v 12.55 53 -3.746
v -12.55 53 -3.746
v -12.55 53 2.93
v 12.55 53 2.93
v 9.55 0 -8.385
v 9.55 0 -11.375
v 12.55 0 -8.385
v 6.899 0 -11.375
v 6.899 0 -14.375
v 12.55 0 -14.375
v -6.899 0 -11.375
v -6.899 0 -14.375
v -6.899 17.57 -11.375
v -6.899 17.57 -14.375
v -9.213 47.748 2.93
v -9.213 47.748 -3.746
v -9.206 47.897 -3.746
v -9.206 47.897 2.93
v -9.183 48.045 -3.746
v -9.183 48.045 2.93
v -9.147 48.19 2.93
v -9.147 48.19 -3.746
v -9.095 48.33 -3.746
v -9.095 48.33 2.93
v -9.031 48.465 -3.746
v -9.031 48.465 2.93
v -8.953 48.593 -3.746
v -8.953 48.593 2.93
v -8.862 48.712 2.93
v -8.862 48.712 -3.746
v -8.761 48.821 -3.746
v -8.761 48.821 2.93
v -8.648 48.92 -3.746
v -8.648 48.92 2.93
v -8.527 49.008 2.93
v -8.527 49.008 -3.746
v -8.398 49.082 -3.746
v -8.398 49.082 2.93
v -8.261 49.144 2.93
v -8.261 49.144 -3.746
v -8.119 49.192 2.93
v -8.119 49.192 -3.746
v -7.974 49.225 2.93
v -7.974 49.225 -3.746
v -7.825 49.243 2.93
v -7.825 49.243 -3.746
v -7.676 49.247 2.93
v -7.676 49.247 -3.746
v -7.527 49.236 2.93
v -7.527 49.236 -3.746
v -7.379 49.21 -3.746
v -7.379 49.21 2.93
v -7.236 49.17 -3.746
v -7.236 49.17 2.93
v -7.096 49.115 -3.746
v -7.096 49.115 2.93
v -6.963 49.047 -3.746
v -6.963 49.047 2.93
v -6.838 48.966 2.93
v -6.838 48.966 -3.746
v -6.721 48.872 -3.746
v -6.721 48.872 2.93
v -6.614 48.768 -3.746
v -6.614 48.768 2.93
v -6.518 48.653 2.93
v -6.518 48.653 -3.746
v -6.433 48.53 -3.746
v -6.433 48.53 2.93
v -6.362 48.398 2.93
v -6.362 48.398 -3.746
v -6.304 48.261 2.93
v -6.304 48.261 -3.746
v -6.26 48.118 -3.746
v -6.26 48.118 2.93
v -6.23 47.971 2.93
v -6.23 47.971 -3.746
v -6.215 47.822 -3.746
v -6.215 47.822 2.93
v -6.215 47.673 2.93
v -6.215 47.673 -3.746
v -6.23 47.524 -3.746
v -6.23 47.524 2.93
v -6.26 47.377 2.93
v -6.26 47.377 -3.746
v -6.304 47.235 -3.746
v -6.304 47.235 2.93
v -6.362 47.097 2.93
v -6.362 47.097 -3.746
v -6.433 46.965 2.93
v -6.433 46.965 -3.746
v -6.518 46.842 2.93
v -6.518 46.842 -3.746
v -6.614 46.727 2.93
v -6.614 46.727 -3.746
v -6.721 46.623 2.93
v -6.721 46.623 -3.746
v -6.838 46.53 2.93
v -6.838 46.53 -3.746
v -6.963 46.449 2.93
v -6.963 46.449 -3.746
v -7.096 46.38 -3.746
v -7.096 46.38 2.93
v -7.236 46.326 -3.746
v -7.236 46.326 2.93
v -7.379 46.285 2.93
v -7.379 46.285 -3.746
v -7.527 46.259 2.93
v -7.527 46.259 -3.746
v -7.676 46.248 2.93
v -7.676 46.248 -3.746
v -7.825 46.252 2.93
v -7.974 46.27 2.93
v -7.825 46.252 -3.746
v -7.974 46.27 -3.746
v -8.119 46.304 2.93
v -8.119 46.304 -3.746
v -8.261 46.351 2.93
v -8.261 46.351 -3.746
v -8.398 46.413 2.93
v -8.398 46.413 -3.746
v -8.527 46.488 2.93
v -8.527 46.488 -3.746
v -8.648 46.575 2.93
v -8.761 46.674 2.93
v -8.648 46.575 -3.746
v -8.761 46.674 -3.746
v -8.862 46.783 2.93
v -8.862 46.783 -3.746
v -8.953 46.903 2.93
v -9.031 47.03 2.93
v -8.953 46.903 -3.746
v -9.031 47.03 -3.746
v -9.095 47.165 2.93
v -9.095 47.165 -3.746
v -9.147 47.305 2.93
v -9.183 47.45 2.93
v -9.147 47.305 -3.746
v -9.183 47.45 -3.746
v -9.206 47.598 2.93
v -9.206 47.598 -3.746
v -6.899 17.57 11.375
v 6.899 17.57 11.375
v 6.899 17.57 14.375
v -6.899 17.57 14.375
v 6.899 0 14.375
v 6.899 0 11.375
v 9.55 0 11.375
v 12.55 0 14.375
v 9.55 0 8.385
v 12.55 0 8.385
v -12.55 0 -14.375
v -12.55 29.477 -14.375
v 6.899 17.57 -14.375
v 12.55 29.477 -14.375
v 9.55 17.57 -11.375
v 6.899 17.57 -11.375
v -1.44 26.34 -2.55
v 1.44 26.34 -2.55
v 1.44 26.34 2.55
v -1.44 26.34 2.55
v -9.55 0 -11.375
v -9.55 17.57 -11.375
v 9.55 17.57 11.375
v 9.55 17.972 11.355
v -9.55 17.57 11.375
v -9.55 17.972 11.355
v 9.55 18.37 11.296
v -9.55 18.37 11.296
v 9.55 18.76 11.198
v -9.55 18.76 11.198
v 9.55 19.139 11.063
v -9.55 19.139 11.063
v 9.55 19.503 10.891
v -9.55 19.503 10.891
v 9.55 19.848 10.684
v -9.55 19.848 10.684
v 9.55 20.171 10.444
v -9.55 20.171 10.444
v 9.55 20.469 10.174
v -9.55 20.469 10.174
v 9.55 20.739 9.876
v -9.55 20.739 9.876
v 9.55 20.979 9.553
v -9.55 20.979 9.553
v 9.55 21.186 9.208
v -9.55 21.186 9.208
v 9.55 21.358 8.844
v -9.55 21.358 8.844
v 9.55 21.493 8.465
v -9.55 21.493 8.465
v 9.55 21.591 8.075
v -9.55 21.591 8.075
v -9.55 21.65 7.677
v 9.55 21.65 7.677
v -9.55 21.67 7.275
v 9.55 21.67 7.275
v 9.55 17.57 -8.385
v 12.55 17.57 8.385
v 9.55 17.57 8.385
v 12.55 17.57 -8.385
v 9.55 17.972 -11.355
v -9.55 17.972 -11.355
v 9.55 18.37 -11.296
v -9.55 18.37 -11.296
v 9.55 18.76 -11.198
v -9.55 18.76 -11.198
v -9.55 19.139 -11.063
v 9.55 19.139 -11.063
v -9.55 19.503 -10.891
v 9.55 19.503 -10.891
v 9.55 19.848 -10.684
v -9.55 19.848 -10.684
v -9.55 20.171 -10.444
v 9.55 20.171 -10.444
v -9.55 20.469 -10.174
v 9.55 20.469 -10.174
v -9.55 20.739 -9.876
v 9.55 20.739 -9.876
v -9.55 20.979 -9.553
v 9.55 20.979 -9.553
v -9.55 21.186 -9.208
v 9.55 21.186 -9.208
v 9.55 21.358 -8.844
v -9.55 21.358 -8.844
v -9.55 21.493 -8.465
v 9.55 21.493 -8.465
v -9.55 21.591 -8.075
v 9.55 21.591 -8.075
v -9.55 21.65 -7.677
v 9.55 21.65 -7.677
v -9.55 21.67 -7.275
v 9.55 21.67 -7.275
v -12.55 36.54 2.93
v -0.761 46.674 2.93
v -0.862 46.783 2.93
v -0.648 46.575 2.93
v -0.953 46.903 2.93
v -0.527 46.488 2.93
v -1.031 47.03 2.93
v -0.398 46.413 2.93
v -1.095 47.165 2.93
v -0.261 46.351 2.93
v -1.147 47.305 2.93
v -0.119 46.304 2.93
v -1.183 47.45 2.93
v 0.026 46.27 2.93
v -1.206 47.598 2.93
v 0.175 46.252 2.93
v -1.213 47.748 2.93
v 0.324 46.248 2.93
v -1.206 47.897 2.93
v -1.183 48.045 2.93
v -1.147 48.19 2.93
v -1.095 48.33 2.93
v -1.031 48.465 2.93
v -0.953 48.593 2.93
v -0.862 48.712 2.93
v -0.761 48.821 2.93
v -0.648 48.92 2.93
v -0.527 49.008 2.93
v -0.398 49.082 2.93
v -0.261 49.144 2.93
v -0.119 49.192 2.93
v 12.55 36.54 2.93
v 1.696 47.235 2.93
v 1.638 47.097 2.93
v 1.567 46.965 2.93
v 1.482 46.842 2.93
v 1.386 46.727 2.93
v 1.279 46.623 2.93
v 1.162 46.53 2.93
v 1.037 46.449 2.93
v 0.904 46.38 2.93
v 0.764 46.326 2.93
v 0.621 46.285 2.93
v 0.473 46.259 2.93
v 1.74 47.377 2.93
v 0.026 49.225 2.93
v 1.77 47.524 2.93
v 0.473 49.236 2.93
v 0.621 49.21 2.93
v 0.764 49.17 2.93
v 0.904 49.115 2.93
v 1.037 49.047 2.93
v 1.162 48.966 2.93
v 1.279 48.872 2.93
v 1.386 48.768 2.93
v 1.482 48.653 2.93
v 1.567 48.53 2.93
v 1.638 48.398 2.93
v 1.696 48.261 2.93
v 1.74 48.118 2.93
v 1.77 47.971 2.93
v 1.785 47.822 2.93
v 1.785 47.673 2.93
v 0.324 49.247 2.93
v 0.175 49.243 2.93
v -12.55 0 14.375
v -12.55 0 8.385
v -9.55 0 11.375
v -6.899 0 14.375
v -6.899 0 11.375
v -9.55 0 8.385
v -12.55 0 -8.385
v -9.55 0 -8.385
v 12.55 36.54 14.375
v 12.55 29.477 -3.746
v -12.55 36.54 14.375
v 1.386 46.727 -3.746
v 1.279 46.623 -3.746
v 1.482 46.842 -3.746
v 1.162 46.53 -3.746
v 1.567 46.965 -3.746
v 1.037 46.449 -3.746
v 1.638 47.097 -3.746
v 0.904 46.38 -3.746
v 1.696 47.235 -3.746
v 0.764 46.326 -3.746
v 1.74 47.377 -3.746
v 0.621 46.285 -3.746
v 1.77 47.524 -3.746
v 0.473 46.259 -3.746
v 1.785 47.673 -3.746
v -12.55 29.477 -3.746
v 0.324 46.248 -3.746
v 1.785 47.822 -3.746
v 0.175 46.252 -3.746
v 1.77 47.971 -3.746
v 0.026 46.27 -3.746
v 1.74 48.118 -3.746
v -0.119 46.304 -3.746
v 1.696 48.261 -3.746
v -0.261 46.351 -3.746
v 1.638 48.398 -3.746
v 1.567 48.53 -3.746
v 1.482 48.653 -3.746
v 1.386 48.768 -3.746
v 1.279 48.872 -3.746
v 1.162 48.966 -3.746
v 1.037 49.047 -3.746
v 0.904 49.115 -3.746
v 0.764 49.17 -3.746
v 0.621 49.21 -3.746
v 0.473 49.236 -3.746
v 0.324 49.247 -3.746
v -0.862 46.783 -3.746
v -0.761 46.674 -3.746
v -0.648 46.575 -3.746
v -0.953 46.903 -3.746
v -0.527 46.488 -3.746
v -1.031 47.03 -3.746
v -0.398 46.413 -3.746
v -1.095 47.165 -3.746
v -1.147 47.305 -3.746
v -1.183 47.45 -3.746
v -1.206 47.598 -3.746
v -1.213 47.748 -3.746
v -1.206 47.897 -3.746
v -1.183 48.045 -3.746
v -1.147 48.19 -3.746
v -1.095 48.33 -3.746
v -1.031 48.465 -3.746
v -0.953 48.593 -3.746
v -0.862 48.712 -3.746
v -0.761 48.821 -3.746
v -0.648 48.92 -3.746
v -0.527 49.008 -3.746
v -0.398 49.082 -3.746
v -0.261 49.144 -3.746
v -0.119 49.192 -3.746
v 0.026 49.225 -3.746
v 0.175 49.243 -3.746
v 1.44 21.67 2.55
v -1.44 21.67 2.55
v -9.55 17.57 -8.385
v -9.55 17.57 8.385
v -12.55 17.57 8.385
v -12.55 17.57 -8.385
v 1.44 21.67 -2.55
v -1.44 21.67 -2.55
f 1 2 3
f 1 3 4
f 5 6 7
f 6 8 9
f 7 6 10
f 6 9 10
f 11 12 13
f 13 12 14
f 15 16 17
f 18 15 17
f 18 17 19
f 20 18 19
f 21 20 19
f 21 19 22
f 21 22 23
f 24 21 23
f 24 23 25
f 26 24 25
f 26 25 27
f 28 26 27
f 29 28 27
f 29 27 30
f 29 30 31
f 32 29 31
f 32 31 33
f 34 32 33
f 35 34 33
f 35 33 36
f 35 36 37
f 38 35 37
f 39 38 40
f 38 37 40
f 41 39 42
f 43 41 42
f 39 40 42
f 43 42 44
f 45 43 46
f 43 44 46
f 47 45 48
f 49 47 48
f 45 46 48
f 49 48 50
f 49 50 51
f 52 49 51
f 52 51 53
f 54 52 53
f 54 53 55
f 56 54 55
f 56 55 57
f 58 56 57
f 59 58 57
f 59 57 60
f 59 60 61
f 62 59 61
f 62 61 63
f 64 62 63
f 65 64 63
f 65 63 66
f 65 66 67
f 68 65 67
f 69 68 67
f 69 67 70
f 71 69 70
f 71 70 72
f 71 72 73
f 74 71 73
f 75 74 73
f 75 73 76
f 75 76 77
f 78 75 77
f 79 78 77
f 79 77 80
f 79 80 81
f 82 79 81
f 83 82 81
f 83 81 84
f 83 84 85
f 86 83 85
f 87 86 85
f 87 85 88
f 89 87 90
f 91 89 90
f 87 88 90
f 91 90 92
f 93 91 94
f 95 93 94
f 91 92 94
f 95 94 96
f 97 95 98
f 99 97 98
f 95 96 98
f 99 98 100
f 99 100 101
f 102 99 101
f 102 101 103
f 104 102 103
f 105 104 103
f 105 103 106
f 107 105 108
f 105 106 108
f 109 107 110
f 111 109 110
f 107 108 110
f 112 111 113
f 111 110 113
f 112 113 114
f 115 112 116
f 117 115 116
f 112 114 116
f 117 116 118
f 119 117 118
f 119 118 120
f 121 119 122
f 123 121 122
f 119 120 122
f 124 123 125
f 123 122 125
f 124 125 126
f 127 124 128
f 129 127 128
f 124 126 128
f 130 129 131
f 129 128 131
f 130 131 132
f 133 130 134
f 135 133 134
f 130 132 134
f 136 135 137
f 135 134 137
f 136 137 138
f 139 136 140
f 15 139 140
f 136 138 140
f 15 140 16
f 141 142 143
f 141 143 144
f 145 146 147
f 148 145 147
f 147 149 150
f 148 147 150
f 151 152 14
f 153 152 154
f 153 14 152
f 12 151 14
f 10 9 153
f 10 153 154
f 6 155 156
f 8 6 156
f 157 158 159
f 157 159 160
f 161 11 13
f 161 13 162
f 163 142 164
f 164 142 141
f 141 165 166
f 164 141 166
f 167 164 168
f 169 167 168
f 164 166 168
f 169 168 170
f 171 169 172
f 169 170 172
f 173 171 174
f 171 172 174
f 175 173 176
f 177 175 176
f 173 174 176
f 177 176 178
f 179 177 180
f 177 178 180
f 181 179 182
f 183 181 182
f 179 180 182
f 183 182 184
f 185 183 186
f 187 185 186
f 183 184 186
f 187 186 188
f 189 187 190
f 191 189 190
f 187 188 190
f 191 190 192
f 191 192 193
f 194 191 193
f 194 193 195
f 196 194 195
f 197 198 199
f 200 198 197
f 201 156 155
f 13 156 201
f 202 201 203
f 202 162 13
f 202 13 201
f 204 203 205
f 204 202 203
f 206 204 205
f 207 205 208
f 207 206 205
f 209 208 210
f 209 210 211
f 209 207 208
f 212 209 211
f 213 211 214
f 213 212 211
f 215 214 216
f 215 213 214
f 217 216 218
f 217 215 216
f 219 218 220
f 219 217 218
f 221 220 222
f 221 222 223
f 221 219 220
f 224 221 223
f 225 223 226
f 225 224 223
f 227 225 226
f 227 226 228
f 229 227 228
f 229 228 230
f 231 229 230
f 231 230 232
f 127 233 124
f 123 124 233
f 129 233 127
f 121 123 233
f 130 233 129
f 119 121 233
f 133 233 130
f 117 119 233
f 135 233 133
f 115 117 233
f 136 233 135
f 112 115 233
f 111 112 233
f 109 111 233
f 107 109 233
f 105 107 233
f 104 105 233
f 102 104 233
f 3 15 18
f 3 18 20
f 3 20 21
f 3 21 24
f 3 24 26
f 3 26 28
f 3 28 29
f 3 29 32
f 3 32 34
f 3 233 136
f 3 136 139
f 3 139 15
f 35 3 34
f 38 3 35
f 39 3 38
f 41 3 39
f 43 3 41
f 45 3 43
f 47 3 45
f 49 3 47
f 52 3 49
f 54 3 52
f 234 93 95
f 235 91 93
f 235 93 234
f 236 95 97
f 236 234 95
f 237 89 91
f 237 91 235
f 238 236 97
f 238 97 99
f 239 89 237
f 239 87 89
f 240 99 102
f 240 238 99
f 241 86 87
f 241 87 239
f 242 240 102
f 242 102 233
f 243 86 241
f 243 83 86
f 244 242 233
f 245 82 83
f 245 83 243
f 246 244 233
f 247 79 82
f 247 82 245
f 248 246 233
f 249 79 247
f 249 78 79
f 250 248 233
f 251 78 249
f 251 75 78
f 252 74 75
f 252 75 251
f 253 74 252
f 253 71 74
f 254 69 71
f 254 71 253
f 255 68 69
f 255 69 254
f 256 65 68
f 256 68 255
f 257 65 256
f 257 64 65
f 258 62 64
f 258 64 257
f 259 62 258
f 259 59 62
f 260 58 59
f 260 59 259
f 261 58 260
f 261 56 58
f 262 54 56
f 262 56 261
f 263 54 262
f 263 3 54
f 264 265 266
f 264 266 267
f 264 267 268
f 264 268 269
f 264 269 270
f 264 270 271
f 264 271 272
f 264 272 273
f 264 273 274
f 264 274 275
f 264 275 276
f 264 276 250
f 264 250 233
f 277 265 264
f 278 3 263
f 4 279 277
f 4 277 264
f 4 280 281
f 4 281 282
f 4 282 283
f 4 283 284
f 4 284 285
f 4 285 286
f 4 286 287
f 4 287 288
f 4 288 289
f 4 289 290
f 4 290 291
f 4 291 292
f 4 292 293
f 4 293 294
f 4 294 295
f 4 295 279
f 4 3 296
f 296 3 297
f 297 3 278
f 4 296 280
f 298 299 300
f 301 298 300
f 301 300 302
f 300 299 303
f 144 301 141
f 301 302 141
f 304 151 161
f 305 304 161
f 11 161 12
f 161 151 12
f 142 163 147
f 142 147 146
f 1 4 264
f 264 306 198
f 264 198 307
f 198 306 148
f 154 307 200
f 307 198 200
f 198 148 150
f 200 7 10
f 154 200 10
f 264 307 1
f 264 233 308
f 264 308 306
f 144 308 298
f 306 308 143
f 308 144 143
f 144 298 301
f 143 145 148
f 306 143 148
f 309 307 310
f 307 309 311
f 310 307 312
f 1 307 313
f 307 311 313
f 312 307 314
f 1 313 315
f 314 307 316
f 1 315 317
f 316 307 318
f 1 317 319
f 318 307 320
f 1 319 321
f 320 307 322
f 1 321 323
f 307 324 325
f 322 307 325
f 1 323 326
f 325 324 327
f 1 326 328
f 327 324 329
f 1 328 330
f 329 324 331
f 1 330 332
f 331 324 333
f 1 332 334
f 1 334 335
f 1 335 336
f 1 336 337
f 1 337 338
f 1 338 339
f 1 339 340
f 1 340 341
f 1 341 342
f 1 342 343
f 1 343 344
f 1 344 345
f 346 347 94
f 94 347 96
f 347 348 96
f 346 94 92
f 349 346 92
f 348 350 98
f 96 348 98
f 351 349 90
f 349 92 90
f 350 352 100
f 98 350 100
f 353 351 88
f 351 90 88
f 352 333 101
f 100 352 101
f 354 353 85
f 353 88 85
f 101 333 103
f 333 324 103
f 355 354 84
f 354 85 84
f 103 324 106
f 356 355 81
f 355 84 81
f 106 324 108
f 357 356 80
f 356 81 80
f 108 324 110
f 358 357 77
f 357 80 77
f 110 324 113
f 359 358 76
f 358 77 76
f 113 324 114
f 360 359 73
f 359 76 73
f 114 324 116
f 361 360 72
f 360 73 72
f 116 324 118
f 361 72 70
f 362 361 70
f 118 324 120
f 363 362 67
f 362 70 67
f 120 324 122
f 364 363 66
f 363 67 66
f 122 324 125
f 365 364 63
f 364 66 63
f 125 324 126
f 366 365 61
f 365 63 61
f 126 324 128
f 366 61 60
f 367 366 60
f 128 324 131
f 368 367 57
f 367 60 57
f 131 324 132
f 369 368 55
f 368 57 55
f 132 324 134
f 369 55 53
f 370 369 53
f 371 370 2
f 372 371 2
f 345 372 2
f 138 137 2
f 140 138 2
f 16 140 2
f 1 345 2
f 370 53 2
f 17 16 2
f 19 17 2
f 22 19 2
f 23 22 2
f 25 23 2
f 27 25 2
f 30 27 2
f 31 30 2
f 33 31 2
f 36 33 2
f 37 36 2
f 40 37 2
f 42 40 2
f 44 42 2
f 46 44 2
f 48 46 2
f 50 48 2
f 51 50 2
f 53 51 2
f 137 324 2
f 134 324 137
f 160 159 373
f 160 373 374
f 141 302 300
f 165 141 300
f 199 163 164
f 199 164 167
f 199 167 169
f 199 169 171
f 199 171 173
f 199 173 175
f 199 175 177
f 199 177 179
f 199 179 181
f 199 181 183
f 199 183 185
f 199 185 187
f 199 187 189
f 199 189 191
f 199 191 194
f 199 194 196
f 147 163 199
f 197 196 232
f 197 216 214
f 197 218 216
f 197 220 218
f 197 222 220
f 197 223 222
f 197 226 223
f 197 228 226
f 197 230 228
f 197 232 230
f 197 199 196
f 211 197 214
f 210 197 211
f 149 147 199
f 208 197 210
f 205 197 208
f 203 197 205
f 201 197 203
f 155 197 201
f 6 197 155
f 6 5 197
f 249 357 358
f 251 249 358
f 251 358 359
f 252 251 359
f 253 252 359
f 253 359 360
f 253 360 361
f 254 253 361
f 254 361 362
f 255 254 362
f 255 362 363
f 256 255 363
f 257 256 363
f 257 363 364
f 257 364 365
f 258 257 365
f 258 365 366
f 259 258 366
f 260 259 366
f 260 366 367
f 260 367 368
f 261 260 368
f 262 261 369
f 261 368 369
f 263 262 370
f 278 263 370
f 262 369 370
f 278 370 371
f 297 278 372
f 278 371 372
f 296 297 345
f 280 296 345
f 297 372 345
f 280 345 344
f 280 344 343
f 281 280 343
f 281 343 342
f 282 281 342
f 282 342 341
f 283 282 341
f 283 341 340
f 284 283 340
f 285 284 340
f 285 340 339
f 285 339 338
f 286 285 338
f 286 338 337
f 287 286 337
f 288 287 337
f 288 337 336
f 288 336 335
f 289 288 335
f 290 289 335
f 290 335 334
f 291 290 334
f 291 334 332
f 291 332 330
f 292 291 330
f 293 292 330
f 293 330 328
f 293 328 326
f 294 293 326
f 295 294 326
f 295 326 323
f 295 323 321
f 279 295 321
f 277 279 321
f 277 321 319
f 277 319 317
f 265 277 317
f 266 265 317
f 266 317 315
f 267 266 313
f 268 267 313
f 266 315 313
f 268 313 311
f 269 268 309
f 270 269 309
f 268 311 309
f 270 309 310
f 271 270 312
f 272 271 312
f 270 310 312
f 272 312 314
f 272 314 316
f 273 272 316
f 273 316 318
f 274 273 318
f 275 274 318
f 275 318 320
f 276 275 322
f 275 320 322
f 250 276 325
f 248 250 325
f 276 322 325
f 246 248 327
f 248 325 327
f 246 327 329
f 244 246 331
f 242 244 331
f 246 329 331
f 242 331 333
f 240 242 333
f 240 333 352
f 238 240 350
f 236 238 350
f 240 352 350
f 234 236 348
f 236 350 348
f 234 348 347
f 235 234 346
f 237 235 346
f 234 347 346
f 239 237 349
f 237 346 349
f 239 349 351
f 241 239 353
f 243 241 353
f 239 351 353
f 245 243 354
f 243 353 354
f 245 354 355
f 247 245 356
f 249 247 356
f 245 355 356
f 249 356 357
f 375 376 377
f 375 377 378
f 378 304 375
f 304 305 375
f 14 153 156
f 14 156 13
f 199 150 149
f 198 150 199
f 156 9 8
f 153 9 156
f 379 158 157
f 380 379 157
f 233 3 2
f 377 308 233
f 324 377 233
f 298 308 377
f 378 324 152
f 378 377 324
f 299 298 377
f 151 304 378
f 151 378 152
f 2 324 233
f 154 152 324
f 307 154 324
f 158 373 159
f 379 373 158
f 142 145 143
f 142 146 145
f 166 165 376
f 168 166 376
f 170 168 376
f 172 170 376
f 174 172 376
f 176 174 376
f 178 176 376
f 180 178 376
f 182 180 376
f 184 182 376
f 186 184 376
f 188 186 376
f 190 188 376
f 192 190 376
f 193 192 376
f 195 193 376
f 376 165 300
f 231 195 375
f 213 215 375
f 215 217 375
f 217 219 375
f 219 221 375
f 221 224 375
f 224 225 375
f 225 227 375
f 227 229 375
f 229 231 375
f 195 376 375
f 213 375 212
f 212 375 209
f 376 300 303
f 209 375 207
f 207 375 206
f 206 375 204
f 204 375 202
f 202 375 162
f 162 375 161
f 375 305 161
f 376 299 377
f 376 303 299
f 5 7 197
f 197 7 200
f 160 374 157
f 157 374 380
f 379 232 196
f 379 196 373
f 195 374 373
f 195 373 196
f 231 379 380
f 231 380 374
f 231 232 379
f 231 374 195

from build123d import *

# Parameters (mm, degrees)
SKETCH4_W           = 25.1
SKETCH4_H           = 28.75
BOSS_EXTRUDE2_DEPTH = 53
SKETCH5_W           = 19.1
SKETCH5_H           = 22.75
CUT_EXTRUDE1_DEPTH  = 21.67
FILLET1_R           = 4.1
SKETCH6_W           = 2.88
SKETCH6_H           = 5.1
CUT_EXTRUDE2_DEPTH  = 4.67
SKETCH7_W           = 16.769550268
SKETCH7_H           = 35.14
CUT_EXTRUDE3_DEPTH  = 40
SKETCH8_W           = 13.798322684
SKETCH8_H           = 35.14
CUT_EXTRUDE4_DEPTH  = 40
SKETCH9_W           = 8.5
SKETCH9_H           = 16.46
CUT_EXTRUDE5_DEPTH  = 40
SKETCH10_W          = 10.629287706
SKETCH10_H          = 23.523496481
CUT_EXTRUDE6_DEPTH  = 40
SKETCH11_W          = 25.1
SKETCH11_H          = 2.9448388
CUT_EXTRUDE7_DEPTH  = 16.46
SKETCH14_R          = 1.5
CUT_EXTRUDE10_DEPTH = 23.1
SKETCH13_R          = 1.5
CUT_EXTRUDE11_DEPTH = 23.1


with BuildPart() as part:
    # Sketch4 → Boss-Extrude2 (new body)
    with BuildSketch(Plane(origin=(0, 0, 0), x_dir=(1, 0, 0), z_dir=(0, 1, 0))):
        Rectangle(SKETCH4_W, SKETCH4_H)
    extrude(amount=BOSS_EXTRUDE2_DEPTH)

    # Sketch5 → Cut-Extrude1 (cut)
    with BuildSketch(Plane(origin=(0, 0, 0), x_dir=(-1, 0, 0), z_dir=(0, -1, 0))):
        Rectangle(SKETCH5_W, SKETCH5_H)
    extrude(amount=-CUT_EXTRUDE1_DEPTH, mode=Mode.SUBTRACT)

    # Fillet1
    fillet1_edges = [part.edges().sort_by_distance(p)[0] for p in [
        (0, 21.67, -11.375),
        (0, 21.67, 11.375),
    ]]
    fillet(fillet1_edges, radius=FILLET1_R)

    # Sketch6 → Cut-Extrude2 (cut)
    with BuildSketch(Plane(origin=(0, 21.67, 0), x_dir=(-1, 0, 0), z_dir=(0, -1, 0))):
        Rectangle(SKETCH6_W, SKETCH6_H)
    extrude(amount=-CUT_EXTRUDE2_DEPTH, mode=Mode.SUBTRACT)

    # Sketch7 → Cut-Extrude3 (cut)
    with BuildSketch(Plane(origin=(12.55, 0, 0), x_dir=(0, 0, -1), z_dir=(1, 0, 0))):
        Rectangle(SKETCH7_W, SKETCH7_H)
    extrude(amount=-CUT_EXTRUDE3_DEPTH, mode=Mode.SUBTRACT)

    # Sketch8 → Cut-Extrude4 (cut)
    with BuildSketch(Plane(origin=(0, 0, -14.375), x_dir=(-1, 0, 0), z_dir=(0, 0, -1))):
        Rectangle(SKETCH8_W, SKETCH8_H)
    extrude(amount=-CUT_EXTRUDE4_DEPTH, mode=Mode.SUBTRACT)

    # Sketch9 → Cut-Extrude5 (cut)
    with BuildSketch(Plane.ZY.offset(12.55)):
        with Locations((10.125, 44.77)):
            Rectangle(SKETCH9_W, SKETCH9_H)
    extrude(amount=-CUT_EXTRUDE5_DEPTH, mode=Mode.SUBTRACT)

    # Sketch10 → Cut-Extrude6 (cut)
    with BuildSketch(Plane.ZY.offset(12.55)):
        with Locations((-9.060356147, 41.23825176)):
            Rectangle(SKETCH10_W, SKETCH10_H)
    extrude(amount=-CUT_EXTRUDE6_DEPTH, mode=Mode.SUBTRACT)

    # Sketch11 → Cut-Extrude7 (cut)
    with BuildSketch(Plane(origin=(0, 53, 0), x_dir=(1, 0, 0), z_dir=(0, 1, 0))):
        with Locations((0, -4.4025806)):
            Rectangle(SKETCH11_W, SKETCH11_H)
    extrude(amount=-CUT_EXTRUDE7_DEPTH, mode=Mode.SUBTRACT)

    # Sketch14 → Cut-Extrude10 (cut)
    with BuildSketch(Plane(origin=(0, 0, -3.745712294), x_dir=(-1, 0, 0), z_dir=(0, 0, -1))):
        with Locations((-0.286761368, 47.74761558)):
            Circle(SKETCH14_R)
    extrude(amount=-CUT_EXTRUDE10_DEPTH, mode=Mode.SUBTRACT)

    # Sketch13 → Cut-Extrude11 (cut)
    with BuildSketch(Plane(origin=(0, 0, -3.745712294), x_dir=(-1, 0, 0), z_dir=(0, 0, -1))):
        with Locations((7.713238632, 47.74761558)):
            Circle(SKETCH13_R)
    extrude(amount=-CUT_EXTRUDE11_DEPTH, mode=Mode.SUBTRACT)


solid = part.part
